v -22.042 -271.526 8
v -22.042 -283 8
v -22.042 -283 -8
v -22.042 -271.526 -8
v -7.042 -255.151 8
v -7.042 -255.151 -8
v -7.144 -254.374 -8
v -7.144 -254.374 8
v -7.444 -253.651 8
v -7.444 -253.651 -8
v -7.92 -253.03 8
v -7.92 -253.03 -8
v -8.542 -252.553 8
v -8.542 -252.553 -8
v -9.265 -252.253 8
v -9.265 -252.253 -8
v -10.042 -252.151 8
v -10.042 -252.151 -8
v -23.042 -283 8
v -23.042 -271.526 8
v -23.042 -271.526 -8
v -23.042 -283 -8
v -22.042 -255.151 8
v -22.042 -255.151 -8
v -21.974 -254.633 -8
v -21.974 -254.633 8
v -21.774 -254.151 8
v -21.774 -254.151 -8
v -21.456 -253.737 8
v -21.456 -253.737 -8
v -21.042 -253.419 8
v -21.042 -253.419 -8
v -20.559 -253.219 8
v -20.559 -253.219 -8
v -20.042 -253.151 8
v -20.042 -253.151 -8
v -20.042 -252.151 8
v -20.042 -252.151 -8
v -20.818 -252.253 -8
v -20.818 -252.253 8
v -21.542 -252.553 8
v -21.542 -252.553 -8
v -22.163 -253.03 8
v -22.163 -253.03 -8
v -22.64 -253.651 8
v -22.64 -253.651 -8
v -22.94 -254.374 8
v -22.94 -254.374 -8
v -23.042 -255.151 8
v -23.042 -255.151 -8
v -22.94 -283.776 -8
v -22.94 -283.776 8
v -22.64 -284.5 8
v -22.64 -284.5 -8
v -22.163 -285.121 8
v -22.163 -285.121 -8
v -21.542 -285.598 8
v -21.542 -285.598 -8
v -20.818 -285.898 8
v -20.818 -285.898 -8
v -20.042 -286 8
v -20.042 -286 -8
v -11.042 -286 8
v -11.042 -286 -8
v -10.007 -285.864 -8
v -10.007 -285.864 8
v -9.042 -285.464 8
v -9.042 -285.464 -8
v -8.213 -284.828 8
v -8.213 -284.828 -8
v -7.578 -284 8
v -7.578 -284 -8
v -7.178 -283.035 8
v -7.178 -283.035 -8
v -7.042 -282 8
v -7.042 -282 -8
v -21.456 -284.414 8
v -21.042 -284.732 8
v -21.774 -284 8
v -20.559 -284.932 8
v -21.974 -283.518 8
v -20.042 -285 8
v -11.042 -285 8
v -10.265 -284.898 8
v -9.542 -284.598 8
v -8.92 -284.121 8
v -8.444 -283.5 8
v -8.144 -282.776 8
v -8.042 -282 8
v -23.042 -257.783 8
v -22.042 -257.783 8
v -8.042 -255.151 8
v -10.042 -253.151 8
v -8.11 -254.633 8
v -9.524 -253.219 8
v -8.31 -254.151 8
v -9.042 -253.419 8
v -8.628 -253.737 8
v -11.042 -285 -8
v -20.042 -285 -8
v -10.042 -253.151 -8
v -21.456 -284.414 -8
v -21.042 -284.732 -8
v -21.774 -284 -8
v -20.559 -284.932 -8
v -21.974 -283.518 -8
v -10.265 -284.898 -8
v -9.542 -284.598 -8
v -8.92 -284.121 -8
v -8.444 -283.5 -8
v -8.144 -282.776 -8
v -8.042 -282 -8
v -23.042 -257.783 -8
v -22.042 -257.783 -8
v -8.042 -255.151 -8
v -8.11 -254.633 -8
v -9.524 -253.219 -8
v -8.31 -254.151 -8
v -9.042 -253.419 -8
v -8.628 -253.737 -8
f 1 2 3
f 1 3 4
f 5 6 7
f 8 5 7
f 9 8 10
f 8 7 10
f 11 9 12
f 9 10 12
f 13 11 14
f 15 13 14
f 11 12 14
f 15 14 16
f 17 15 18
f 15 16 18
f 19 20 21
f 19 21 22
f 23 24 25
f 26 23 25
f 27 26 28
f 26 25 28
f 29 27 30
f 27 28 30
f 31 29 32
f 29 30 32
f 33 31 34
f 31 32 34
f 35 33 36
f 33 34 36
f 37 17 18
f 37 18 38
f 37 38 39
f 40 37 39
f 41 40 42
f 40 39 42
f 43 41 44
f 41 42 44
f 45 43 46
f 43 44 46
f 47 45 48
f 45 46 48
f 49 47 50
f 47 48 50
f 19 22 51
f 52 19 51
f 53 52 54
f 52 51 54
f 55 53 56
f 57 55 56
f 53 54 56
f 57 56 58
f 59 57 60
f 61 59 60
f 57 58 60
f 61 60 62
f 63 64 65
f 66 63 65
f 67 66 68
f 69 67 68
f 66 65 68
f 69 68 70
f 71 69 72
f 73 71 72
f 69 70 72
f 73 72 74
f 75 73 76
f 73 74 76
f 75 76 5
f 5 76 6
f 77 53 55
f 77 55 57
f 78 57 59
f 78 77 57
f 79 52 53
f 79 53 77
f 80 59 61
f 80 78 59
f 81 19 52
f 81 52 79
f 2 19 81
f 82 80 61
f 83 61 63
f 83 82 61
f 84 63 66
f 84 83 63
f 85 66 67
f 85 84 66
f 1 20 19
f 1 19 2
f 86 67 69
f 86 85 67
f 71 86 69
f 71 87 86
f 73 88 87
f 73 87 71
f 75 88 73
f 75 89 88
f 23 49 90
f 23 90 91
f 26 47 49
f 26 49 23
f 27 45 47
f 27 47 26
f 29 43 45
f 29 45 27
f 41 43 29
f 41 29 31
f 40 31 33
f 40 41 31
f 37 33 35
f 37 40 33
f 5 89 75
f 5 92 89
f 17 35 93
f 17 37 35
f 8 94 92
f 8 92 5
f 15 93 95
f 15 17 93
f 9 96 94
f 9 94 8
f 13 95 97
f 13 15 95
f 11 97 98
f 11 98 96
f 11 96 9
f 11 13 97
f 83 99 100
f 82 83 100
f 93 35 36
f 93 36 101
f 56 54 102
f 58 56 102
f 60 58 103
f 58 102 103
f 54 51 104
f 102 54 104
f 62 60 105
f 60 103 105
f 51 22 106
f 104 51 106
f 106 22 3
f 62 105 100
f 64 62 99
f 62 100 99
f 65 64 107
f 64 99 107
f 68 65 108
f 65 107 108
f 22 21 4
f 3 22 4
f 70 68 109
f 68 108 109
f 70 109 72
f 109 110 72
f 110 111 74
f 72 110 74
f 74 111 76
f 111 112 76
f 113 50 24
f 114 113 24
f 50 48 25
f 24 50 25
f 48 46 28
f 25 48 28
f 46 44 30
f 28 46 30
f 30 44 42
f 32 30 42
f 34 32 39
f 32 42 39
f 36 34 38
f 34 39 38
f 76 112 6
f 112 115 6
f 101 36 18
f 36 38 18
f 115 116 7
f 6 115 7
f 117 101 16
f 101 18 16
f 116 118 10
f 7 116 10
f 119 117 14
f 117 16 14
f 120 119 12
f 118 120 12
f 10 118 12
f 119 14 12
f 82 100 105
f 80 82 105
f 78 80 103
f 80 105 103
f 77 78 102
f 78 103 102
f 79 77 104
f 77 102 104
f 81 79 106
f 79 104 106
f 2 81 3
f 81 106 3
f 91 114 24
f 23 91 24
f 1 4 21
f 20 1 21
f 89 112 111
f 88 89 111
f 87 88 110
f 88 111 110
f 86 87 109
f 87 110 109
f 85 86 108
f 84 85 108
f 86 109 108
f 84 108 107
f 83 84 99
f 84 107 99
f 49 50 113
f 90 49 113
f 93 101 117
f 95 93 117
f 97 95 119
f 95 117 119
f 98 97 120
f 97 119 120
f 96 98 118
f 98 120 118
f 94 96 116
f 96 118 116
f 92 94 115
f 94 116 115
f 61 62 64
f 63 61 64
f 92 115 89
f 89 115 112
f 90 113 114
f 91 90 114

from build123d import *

# Parameters (mm, degrees)
BOSS_EXTRUDE1_DEPTH      = 8
BOSS_EXTRUDE1_DEPTH_BACK = 8


with BuildPart() as part:
    # Sketch1 → Boss-Extrude1 (new, two sides: drawn at the far end of the back side and taken through both)
    with BuildSketch(Plane.XY.offset(-BOSS_EXTRUDE1_DEPTH_BACK)):
        with BuildLine():
            Line((-23.041785381, -271.526308081), (-23.041785381, -283))
            ThreePointArc((-23.041785381, -283), (-22.163105725, -285.121320344), (-20.041785381, -286))
            Line((-20.041785381, -286), (-11.041785381, -286))
            ThreePointArc((-11.041785381, -286), (-8.213358256, -284.828427125), (-7.041785381, -282))
            Line((-7.041785381, -282), (-7.041785381, -255.150929215))
            ThreePointArc((-7.041785381, -255.150929215), (-7.920465038, -253.029608872), (-10.041785381, -252.150929215))
            Line((-10.041785381, -252.150929215), (-20.041785381, -252.150929215))
            ThreePointArc((-20.041785381, -252.150929215), (-22.163105725, -253.029608872), (-23.041785381, -255.150929215))
            Line((-23.041785381, -255.150929215), (-23.041785381, -257.783091126))
            Line((-23.041785381, -257.783091126), (-22.041785381, -257.783091126))
            Line((-22.041785381, -257.783091126), (-22.041785381, -255.150929215))
            ThreePointArc((-22.041785381, -255.150929215), (-21.455998944, -253.736715653), (-20.041785381, -253.150929215))
            Line((-20.041785381, -253.150929215), (-10.041785381, -253.150929215))
            ThreePointArc((-10.041785381, -253.150929215), (-8.627571819, -253.736715653), (-8.041785381, -255.150929215))
            Line((-8.041785381, -255.150929215), (-8.041785381, -282))
            ThreePointArc((-8.041785381, -282), (-8.920465038, -284.121320344), (-11.041785381, -285))
            Line((-11.041785381, -285), (-20.041785381, -285))
            ThreePointArc((-20.041785381, -285), (-21.455998944, -284.414213562), (-22.041785381, -283))
            Line((-22.041785381, -283), (-22.041785381, -271.526308081))
            Line((-22.041785381, -271.526308081), (-23.041785381, -271.526308081))
        make_face()
    extrude(amount=BOSS_EXTRUDE1_DEPTH + BOSS_EXTRUDE1_DEPTH_BACK)


solid = part.part
